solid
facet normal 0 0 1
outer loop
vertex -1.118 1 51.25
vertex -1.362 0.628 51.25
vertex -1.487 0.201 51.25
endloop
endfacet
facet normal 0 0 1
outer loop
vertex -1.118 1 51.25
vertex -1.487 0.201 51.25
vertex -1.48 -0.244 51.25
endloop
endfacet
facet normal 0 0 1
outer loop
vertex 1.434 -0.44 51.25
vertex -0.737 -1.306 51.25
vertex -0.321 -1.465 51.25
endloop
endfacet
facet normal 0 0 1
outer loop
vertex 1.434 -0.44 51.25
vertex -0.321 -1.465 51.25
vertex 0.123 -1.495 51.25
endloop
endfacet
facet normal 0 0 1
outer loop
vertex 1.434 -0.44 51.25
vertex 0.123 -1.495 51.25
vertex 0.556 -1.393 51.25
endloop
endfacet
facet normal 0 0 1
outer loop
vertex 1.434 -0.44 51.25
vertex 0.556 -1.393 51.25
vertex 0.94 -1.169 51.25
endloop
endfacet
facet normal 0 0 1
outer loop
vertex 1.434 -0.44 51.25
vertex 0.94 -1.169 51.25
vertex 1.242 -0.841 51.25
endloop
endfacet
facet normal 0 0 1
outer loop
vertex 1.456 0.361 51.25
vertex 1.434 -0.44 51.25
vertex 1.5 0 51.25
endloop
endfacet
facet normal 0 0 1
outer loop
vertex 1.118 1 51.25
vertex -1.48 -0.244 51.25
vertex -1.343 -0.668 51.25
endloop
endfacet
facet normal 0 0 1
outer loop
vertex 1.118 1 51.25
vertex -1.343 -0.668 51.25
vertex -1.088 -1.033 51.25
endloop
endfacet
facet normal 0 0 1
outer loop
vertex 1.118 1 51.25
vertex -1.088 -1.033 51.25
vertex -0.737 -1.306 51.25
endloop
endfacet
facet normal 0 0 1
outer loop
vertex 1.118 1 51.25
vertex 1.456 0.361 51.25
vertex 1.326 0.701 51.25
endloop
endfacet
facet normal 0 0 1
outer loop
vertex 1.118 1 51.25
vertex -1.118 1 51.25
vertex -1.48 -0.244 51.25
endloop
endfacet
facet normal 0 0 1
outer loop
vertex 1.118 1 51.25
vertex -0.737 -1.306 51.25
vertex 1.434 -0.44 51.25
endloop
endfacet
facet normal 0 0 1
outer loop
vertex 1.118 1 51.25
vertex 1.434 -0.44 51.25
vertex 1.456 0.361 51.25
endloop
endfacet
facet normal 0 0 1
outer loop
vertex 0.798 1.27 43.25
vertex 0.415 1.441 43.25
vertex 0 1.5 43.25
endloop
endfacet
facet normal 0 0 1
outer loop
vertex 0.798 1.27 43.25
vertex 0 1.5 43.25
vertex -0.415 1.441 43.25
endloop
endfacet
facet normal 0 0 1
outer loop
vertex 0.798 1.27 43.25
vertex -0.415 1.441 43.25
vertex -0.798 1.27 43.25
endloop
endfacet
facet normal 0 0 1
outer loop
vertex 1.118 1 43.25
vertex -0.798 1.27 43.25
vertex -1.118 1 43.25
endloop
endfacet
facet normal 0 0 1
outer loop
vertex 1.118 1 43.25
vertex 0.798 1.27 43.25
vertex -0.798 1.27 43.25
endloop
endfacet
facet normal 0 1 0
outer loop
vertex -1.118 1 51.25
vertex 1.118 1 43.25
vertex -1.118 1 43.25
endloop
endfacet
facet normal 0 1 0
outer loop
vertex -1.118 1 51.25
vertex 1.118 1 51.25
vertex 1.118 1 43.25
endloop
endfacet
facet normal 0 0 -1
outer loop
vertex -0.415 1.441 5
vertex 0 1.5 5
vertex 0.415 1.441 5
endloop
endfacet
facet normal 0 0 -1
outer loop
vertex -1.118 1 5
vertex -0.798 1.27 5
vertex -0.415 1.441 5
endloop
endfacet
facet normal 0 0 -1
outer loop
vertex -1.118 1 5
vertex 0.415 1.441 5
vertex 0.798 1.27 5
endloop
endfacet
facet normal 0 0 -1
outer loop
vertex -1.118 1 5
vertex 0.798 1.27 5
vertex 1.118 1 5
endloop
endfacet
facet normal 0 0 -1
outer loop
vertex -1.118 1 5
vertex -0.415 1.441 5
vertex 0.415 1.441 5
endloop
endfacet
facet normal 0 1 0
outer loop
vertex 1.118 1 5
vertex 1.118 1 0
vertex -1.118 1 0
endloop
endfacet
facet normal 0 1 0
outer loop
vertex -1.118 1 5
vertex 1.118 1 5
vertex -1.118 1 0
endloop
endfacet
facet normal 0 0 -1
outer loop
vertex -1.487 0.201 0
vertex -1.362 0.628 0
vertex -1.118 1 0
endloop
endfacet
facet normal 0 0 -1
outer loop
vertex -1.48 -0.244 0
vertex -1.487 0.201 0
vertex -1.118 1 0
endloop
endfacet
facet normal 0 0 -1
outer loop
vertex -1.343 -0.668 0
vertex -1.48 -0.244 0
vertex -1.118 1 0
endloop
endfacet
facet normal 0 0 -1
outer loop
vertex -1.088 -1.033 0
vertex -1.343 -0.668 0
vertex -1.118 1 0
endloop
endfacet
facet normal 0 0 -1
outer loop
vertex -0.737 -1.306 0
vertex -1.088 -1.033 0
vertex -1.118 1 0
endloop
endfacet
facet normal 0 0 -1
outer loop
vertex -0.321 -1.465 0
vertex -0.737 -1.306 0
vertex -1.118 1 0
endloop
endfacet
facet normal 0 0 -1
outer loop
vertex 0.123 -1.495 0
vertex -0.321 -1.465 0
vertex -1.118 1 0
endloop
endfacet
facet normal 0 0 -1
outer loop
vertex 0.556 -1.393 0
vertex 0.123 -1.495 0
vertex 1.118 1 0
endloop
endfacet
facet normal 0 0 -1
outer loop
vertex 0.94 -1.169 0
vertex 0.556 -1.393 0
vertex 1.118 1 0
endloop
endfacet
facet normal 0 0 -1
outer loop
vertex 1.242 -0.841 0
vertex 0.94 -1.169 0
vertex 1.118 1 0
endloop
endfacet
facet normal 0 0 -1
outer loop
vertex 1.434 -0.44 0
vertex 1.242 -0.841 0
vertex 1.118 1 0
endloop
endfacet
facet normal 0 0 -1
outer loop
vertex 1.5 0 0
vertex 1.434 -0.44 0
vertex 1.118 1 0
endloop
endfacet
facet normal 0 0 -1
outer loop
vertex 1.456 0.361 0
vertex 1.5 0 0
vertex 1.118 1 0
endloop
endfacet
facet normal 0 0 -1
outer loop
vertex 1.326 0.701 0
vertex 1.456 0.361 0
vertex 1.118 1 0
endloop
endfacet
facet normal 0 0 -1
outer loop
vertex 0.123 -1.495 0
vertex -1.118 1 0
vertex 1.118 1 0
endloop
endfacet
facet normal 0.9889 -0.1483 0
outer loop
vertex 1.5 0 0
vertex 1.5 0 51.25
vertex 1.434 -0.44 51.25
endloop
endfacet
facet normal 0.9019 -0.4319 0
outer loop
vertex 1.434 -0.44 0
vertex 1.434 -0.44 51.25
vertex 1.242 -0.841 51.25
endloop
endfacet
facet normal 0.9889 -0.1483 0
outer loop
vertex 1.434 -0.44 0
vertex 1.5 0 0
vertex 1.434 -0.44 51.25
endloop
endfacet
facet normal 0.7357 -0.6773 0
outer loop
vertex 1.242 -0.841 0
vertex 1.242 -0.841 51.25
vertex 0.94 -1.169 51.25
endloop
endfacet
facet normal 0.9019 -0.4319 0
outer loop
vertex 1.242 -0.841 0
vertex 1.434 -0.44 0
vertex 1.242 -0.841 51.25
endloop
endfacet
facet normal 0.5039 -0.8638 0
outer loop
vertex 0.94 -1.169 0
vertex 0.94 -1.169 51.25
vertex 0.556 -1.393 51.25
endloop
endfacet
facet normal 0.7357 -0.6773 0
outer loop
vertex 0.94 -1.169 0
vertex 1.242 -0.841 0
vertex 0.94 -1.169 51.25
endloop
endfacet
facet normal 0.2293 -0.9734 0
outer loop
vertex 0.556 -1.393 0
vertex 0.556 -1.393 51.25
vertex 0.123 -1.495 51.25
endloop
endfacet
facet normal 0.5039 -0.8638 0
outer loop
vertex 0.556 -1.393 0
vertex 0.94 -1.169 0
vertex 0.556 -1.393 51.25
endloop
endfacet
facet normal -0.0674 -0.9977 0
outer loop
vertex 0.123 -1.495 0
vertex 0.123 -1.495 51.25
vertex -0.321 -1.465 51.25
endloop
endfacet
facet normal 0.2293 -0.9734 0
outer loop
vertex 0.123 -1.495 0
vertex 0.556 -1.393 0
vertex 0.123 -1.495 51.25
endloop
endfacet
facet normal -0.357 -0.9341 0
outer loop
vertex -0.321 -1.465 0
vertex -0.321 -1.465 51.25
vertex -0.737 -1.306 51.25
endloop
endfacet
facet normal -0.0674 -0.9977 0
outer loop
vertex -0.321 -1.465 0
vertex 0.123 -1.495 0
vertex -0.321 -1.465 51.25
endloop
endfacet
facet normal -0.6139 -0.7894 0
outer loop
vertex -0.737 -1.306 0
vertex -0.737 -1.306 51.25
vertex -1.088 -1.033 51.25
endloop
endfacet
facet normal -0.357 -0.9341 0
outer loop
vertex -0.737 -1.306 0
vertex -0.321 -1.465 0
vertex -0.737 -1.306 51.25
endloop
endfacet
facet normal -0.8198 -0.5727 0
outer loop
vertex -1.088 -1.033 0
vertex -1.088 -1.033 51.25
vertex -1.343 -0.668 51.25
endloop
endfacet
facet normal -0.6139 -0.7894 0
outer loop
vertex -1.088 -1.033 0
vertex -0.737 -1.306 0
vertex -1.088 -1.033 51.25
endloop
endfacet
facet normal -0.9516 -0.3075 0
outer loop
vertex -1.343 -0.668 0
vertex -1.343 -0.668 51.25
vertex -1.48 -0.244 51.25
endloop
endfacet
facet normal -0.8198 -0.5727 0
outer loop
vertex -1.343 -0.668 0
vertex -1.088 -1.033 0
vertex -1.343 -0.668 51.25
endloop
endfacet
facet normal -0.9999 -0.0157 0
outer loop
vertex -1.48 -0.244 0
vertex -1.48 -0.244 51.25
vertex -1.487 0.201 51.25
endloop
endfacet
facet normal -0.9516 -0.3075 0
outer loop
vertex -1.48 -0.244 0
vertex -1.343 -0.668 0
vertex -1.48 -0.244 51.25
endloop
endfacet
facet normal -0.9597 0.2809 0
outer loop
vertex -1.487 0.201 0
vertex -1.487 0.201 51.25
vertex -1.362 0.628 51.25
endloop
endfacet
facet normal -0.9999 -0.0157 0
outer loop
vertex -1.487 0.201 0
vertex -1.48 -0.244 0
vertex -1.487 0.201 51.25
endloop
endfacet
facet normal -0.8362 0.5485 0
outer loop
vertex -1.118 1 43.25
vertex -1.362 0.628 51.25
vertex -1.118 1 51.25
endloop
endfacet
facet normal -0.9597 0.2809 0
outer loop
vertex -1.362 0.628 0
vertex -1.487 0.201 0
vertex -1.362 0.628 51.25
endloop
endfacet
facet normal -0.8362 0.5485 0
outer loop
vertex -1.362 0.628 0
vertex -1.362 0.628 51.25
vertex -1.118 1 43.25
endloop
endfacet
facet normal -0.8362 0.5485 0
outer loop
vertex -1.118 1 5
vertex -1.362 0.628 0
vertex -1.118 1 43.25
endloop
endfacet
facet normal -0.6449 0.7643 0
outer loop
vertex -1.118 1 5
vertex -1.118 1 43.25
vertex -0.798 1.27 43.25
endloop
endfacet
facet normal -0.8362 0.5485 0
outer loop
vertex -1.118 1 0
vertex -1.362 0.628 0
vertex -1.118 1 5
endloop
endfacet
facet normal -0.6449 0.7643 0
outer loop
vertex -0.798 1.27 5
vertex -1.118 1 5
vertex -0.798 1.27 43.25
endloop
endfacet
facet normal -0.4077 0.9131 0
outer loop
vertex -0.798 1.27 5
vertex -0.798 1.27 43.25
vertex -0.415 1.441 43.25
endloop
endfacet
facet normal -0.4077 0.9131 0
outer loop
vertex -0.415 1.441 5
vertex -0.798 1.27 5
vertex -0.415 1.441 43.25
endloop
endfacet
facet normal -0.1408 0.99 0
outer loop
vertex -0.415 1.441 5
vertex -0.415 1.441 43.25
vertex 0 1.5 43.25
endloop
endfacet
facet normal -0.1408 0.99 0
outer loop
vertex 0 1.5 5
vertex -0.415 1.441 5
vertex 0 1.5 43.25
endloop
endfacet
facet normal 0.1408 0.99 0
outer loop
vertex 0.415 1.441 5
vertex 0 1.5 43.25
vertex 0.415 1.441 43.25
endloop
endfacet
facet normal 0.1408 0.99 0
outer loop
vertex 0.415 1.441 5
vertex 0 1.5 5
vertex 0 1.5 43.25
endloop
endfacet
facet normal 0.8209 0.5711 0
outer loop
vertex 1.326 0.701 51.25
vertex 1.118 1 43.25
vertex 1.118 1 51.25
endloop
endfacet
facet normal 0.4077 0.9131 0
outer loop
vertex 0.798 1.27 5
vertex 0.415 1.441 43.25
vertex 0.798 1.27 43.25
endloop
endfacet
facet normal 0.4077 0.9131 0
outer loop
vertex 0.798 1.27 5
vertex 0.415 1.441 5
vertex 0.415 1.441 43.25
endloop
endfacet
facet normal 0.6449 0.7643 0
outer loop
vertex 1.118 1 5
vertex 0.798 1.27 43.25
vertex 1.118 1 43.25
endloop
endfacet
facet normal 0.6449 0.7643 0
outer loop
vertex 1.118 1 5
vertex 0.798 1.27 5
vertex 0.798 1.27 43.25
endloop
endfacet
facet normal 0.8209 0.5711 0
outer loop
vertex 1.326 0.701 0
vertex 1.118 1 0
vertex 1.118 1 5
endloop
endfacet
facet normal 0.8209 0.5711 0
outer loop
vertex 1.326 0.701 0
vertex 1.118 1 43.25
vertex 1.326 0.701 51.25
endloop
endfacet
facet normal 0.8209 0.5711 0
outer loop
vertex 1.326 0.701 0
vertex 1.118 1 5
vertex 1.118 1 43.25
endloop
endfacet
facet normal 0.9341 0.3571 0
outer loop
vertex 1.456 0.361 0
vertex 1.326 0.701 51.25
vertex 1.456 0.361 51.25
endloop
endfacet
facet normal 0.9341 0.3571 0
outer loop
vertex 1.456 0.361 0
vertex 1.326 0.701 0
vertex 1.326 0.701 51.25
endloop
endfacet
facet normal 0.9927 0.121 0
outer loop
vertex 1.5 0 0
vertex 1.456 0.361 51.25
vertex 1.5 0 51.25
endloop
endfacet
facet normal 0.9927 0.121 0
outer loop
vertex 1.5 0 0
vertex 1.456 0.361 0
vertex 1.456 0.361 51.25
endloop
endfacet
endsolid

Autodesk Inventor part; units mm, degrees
ref_plane "YZ Plane" through (0, 0, 0) normal (1, 0, 0) x (0, 1, 0)
ref_plane "XZ Plane" through (0, 0, 0) normal (0, 1, 0) x (-1, 0, 0)
ref_plane "XY Plane" through (0, 0, 0) normal (0, 0, 1) x (1, 0, 0)
sketch "Эскиз1" plane through (0, 0, 0) normal (0, 0, 1) x (1, 0, 0)
  circle A0 centre (0, 0) radius 1.5
  dimension "d0" = 3
extrude "Выдавливание1" add sketch "Эскиз1" along normal blind 51.25
sketch "Эскиз2" plane through (0, 0, 51.25) normal (0, 0, 1) x (1, 0, 0)
  line L0 (-1.5, -1) -> (1.5, -1)
  line L1 (1.5, -1) -> (1.5, 1)
  line L2 (1.5, 1) -> (-1.5, 1)
  line L3 (-1.5, 1) -> (-1.5, -1)
  line L4 (-1.5, -1) -> (1.5, 1) construction
  line L5 (1.5, -1) -> (-1.5, 1) construction
  circle A0 centre (0, 0) radius 1.5
  point P0 (-1.118, 1)
  point P1 (1.118, 1)
  dimension "d3" = 2
extrude "Выдавливание2" cut sketch "Эскиз2" against normal blind 8 contours A0 L2
sketch "Эскиз3" plane through (0, 0, 0) normal (0, 0, -1) x (-1, 0, 0)
  arc A0 (1.118, 1) -> (-1.118, 1) centre (0, 0) ccw projected
  line L0 (-1.118, 1) -> (1.118, 1) projected
extrude "Выдавливание3" cut sketch "Эскиз3" against normal blind 5
equation "\"Радиус_гибки\" = Толщина"
equation "\"Ширина_просечки\" = Толщина"
equation "\"Глубина_просечки\" = 0.5 * Толщина"
equation "\"Размер_просечки\" = 4 * Толщина"
equation "\"Мин_остаток\" = 2 * Толщина"
equation "\"Радиус_перехода\" = Радиус_гибки"
equation "\"Радиус_Якоби\" = Толщина"
equation "\"Размер_зазора\" = Толщина"
equation "\"Толщина\" = 0.5"
properties part number "Ось 3мм задняя"
